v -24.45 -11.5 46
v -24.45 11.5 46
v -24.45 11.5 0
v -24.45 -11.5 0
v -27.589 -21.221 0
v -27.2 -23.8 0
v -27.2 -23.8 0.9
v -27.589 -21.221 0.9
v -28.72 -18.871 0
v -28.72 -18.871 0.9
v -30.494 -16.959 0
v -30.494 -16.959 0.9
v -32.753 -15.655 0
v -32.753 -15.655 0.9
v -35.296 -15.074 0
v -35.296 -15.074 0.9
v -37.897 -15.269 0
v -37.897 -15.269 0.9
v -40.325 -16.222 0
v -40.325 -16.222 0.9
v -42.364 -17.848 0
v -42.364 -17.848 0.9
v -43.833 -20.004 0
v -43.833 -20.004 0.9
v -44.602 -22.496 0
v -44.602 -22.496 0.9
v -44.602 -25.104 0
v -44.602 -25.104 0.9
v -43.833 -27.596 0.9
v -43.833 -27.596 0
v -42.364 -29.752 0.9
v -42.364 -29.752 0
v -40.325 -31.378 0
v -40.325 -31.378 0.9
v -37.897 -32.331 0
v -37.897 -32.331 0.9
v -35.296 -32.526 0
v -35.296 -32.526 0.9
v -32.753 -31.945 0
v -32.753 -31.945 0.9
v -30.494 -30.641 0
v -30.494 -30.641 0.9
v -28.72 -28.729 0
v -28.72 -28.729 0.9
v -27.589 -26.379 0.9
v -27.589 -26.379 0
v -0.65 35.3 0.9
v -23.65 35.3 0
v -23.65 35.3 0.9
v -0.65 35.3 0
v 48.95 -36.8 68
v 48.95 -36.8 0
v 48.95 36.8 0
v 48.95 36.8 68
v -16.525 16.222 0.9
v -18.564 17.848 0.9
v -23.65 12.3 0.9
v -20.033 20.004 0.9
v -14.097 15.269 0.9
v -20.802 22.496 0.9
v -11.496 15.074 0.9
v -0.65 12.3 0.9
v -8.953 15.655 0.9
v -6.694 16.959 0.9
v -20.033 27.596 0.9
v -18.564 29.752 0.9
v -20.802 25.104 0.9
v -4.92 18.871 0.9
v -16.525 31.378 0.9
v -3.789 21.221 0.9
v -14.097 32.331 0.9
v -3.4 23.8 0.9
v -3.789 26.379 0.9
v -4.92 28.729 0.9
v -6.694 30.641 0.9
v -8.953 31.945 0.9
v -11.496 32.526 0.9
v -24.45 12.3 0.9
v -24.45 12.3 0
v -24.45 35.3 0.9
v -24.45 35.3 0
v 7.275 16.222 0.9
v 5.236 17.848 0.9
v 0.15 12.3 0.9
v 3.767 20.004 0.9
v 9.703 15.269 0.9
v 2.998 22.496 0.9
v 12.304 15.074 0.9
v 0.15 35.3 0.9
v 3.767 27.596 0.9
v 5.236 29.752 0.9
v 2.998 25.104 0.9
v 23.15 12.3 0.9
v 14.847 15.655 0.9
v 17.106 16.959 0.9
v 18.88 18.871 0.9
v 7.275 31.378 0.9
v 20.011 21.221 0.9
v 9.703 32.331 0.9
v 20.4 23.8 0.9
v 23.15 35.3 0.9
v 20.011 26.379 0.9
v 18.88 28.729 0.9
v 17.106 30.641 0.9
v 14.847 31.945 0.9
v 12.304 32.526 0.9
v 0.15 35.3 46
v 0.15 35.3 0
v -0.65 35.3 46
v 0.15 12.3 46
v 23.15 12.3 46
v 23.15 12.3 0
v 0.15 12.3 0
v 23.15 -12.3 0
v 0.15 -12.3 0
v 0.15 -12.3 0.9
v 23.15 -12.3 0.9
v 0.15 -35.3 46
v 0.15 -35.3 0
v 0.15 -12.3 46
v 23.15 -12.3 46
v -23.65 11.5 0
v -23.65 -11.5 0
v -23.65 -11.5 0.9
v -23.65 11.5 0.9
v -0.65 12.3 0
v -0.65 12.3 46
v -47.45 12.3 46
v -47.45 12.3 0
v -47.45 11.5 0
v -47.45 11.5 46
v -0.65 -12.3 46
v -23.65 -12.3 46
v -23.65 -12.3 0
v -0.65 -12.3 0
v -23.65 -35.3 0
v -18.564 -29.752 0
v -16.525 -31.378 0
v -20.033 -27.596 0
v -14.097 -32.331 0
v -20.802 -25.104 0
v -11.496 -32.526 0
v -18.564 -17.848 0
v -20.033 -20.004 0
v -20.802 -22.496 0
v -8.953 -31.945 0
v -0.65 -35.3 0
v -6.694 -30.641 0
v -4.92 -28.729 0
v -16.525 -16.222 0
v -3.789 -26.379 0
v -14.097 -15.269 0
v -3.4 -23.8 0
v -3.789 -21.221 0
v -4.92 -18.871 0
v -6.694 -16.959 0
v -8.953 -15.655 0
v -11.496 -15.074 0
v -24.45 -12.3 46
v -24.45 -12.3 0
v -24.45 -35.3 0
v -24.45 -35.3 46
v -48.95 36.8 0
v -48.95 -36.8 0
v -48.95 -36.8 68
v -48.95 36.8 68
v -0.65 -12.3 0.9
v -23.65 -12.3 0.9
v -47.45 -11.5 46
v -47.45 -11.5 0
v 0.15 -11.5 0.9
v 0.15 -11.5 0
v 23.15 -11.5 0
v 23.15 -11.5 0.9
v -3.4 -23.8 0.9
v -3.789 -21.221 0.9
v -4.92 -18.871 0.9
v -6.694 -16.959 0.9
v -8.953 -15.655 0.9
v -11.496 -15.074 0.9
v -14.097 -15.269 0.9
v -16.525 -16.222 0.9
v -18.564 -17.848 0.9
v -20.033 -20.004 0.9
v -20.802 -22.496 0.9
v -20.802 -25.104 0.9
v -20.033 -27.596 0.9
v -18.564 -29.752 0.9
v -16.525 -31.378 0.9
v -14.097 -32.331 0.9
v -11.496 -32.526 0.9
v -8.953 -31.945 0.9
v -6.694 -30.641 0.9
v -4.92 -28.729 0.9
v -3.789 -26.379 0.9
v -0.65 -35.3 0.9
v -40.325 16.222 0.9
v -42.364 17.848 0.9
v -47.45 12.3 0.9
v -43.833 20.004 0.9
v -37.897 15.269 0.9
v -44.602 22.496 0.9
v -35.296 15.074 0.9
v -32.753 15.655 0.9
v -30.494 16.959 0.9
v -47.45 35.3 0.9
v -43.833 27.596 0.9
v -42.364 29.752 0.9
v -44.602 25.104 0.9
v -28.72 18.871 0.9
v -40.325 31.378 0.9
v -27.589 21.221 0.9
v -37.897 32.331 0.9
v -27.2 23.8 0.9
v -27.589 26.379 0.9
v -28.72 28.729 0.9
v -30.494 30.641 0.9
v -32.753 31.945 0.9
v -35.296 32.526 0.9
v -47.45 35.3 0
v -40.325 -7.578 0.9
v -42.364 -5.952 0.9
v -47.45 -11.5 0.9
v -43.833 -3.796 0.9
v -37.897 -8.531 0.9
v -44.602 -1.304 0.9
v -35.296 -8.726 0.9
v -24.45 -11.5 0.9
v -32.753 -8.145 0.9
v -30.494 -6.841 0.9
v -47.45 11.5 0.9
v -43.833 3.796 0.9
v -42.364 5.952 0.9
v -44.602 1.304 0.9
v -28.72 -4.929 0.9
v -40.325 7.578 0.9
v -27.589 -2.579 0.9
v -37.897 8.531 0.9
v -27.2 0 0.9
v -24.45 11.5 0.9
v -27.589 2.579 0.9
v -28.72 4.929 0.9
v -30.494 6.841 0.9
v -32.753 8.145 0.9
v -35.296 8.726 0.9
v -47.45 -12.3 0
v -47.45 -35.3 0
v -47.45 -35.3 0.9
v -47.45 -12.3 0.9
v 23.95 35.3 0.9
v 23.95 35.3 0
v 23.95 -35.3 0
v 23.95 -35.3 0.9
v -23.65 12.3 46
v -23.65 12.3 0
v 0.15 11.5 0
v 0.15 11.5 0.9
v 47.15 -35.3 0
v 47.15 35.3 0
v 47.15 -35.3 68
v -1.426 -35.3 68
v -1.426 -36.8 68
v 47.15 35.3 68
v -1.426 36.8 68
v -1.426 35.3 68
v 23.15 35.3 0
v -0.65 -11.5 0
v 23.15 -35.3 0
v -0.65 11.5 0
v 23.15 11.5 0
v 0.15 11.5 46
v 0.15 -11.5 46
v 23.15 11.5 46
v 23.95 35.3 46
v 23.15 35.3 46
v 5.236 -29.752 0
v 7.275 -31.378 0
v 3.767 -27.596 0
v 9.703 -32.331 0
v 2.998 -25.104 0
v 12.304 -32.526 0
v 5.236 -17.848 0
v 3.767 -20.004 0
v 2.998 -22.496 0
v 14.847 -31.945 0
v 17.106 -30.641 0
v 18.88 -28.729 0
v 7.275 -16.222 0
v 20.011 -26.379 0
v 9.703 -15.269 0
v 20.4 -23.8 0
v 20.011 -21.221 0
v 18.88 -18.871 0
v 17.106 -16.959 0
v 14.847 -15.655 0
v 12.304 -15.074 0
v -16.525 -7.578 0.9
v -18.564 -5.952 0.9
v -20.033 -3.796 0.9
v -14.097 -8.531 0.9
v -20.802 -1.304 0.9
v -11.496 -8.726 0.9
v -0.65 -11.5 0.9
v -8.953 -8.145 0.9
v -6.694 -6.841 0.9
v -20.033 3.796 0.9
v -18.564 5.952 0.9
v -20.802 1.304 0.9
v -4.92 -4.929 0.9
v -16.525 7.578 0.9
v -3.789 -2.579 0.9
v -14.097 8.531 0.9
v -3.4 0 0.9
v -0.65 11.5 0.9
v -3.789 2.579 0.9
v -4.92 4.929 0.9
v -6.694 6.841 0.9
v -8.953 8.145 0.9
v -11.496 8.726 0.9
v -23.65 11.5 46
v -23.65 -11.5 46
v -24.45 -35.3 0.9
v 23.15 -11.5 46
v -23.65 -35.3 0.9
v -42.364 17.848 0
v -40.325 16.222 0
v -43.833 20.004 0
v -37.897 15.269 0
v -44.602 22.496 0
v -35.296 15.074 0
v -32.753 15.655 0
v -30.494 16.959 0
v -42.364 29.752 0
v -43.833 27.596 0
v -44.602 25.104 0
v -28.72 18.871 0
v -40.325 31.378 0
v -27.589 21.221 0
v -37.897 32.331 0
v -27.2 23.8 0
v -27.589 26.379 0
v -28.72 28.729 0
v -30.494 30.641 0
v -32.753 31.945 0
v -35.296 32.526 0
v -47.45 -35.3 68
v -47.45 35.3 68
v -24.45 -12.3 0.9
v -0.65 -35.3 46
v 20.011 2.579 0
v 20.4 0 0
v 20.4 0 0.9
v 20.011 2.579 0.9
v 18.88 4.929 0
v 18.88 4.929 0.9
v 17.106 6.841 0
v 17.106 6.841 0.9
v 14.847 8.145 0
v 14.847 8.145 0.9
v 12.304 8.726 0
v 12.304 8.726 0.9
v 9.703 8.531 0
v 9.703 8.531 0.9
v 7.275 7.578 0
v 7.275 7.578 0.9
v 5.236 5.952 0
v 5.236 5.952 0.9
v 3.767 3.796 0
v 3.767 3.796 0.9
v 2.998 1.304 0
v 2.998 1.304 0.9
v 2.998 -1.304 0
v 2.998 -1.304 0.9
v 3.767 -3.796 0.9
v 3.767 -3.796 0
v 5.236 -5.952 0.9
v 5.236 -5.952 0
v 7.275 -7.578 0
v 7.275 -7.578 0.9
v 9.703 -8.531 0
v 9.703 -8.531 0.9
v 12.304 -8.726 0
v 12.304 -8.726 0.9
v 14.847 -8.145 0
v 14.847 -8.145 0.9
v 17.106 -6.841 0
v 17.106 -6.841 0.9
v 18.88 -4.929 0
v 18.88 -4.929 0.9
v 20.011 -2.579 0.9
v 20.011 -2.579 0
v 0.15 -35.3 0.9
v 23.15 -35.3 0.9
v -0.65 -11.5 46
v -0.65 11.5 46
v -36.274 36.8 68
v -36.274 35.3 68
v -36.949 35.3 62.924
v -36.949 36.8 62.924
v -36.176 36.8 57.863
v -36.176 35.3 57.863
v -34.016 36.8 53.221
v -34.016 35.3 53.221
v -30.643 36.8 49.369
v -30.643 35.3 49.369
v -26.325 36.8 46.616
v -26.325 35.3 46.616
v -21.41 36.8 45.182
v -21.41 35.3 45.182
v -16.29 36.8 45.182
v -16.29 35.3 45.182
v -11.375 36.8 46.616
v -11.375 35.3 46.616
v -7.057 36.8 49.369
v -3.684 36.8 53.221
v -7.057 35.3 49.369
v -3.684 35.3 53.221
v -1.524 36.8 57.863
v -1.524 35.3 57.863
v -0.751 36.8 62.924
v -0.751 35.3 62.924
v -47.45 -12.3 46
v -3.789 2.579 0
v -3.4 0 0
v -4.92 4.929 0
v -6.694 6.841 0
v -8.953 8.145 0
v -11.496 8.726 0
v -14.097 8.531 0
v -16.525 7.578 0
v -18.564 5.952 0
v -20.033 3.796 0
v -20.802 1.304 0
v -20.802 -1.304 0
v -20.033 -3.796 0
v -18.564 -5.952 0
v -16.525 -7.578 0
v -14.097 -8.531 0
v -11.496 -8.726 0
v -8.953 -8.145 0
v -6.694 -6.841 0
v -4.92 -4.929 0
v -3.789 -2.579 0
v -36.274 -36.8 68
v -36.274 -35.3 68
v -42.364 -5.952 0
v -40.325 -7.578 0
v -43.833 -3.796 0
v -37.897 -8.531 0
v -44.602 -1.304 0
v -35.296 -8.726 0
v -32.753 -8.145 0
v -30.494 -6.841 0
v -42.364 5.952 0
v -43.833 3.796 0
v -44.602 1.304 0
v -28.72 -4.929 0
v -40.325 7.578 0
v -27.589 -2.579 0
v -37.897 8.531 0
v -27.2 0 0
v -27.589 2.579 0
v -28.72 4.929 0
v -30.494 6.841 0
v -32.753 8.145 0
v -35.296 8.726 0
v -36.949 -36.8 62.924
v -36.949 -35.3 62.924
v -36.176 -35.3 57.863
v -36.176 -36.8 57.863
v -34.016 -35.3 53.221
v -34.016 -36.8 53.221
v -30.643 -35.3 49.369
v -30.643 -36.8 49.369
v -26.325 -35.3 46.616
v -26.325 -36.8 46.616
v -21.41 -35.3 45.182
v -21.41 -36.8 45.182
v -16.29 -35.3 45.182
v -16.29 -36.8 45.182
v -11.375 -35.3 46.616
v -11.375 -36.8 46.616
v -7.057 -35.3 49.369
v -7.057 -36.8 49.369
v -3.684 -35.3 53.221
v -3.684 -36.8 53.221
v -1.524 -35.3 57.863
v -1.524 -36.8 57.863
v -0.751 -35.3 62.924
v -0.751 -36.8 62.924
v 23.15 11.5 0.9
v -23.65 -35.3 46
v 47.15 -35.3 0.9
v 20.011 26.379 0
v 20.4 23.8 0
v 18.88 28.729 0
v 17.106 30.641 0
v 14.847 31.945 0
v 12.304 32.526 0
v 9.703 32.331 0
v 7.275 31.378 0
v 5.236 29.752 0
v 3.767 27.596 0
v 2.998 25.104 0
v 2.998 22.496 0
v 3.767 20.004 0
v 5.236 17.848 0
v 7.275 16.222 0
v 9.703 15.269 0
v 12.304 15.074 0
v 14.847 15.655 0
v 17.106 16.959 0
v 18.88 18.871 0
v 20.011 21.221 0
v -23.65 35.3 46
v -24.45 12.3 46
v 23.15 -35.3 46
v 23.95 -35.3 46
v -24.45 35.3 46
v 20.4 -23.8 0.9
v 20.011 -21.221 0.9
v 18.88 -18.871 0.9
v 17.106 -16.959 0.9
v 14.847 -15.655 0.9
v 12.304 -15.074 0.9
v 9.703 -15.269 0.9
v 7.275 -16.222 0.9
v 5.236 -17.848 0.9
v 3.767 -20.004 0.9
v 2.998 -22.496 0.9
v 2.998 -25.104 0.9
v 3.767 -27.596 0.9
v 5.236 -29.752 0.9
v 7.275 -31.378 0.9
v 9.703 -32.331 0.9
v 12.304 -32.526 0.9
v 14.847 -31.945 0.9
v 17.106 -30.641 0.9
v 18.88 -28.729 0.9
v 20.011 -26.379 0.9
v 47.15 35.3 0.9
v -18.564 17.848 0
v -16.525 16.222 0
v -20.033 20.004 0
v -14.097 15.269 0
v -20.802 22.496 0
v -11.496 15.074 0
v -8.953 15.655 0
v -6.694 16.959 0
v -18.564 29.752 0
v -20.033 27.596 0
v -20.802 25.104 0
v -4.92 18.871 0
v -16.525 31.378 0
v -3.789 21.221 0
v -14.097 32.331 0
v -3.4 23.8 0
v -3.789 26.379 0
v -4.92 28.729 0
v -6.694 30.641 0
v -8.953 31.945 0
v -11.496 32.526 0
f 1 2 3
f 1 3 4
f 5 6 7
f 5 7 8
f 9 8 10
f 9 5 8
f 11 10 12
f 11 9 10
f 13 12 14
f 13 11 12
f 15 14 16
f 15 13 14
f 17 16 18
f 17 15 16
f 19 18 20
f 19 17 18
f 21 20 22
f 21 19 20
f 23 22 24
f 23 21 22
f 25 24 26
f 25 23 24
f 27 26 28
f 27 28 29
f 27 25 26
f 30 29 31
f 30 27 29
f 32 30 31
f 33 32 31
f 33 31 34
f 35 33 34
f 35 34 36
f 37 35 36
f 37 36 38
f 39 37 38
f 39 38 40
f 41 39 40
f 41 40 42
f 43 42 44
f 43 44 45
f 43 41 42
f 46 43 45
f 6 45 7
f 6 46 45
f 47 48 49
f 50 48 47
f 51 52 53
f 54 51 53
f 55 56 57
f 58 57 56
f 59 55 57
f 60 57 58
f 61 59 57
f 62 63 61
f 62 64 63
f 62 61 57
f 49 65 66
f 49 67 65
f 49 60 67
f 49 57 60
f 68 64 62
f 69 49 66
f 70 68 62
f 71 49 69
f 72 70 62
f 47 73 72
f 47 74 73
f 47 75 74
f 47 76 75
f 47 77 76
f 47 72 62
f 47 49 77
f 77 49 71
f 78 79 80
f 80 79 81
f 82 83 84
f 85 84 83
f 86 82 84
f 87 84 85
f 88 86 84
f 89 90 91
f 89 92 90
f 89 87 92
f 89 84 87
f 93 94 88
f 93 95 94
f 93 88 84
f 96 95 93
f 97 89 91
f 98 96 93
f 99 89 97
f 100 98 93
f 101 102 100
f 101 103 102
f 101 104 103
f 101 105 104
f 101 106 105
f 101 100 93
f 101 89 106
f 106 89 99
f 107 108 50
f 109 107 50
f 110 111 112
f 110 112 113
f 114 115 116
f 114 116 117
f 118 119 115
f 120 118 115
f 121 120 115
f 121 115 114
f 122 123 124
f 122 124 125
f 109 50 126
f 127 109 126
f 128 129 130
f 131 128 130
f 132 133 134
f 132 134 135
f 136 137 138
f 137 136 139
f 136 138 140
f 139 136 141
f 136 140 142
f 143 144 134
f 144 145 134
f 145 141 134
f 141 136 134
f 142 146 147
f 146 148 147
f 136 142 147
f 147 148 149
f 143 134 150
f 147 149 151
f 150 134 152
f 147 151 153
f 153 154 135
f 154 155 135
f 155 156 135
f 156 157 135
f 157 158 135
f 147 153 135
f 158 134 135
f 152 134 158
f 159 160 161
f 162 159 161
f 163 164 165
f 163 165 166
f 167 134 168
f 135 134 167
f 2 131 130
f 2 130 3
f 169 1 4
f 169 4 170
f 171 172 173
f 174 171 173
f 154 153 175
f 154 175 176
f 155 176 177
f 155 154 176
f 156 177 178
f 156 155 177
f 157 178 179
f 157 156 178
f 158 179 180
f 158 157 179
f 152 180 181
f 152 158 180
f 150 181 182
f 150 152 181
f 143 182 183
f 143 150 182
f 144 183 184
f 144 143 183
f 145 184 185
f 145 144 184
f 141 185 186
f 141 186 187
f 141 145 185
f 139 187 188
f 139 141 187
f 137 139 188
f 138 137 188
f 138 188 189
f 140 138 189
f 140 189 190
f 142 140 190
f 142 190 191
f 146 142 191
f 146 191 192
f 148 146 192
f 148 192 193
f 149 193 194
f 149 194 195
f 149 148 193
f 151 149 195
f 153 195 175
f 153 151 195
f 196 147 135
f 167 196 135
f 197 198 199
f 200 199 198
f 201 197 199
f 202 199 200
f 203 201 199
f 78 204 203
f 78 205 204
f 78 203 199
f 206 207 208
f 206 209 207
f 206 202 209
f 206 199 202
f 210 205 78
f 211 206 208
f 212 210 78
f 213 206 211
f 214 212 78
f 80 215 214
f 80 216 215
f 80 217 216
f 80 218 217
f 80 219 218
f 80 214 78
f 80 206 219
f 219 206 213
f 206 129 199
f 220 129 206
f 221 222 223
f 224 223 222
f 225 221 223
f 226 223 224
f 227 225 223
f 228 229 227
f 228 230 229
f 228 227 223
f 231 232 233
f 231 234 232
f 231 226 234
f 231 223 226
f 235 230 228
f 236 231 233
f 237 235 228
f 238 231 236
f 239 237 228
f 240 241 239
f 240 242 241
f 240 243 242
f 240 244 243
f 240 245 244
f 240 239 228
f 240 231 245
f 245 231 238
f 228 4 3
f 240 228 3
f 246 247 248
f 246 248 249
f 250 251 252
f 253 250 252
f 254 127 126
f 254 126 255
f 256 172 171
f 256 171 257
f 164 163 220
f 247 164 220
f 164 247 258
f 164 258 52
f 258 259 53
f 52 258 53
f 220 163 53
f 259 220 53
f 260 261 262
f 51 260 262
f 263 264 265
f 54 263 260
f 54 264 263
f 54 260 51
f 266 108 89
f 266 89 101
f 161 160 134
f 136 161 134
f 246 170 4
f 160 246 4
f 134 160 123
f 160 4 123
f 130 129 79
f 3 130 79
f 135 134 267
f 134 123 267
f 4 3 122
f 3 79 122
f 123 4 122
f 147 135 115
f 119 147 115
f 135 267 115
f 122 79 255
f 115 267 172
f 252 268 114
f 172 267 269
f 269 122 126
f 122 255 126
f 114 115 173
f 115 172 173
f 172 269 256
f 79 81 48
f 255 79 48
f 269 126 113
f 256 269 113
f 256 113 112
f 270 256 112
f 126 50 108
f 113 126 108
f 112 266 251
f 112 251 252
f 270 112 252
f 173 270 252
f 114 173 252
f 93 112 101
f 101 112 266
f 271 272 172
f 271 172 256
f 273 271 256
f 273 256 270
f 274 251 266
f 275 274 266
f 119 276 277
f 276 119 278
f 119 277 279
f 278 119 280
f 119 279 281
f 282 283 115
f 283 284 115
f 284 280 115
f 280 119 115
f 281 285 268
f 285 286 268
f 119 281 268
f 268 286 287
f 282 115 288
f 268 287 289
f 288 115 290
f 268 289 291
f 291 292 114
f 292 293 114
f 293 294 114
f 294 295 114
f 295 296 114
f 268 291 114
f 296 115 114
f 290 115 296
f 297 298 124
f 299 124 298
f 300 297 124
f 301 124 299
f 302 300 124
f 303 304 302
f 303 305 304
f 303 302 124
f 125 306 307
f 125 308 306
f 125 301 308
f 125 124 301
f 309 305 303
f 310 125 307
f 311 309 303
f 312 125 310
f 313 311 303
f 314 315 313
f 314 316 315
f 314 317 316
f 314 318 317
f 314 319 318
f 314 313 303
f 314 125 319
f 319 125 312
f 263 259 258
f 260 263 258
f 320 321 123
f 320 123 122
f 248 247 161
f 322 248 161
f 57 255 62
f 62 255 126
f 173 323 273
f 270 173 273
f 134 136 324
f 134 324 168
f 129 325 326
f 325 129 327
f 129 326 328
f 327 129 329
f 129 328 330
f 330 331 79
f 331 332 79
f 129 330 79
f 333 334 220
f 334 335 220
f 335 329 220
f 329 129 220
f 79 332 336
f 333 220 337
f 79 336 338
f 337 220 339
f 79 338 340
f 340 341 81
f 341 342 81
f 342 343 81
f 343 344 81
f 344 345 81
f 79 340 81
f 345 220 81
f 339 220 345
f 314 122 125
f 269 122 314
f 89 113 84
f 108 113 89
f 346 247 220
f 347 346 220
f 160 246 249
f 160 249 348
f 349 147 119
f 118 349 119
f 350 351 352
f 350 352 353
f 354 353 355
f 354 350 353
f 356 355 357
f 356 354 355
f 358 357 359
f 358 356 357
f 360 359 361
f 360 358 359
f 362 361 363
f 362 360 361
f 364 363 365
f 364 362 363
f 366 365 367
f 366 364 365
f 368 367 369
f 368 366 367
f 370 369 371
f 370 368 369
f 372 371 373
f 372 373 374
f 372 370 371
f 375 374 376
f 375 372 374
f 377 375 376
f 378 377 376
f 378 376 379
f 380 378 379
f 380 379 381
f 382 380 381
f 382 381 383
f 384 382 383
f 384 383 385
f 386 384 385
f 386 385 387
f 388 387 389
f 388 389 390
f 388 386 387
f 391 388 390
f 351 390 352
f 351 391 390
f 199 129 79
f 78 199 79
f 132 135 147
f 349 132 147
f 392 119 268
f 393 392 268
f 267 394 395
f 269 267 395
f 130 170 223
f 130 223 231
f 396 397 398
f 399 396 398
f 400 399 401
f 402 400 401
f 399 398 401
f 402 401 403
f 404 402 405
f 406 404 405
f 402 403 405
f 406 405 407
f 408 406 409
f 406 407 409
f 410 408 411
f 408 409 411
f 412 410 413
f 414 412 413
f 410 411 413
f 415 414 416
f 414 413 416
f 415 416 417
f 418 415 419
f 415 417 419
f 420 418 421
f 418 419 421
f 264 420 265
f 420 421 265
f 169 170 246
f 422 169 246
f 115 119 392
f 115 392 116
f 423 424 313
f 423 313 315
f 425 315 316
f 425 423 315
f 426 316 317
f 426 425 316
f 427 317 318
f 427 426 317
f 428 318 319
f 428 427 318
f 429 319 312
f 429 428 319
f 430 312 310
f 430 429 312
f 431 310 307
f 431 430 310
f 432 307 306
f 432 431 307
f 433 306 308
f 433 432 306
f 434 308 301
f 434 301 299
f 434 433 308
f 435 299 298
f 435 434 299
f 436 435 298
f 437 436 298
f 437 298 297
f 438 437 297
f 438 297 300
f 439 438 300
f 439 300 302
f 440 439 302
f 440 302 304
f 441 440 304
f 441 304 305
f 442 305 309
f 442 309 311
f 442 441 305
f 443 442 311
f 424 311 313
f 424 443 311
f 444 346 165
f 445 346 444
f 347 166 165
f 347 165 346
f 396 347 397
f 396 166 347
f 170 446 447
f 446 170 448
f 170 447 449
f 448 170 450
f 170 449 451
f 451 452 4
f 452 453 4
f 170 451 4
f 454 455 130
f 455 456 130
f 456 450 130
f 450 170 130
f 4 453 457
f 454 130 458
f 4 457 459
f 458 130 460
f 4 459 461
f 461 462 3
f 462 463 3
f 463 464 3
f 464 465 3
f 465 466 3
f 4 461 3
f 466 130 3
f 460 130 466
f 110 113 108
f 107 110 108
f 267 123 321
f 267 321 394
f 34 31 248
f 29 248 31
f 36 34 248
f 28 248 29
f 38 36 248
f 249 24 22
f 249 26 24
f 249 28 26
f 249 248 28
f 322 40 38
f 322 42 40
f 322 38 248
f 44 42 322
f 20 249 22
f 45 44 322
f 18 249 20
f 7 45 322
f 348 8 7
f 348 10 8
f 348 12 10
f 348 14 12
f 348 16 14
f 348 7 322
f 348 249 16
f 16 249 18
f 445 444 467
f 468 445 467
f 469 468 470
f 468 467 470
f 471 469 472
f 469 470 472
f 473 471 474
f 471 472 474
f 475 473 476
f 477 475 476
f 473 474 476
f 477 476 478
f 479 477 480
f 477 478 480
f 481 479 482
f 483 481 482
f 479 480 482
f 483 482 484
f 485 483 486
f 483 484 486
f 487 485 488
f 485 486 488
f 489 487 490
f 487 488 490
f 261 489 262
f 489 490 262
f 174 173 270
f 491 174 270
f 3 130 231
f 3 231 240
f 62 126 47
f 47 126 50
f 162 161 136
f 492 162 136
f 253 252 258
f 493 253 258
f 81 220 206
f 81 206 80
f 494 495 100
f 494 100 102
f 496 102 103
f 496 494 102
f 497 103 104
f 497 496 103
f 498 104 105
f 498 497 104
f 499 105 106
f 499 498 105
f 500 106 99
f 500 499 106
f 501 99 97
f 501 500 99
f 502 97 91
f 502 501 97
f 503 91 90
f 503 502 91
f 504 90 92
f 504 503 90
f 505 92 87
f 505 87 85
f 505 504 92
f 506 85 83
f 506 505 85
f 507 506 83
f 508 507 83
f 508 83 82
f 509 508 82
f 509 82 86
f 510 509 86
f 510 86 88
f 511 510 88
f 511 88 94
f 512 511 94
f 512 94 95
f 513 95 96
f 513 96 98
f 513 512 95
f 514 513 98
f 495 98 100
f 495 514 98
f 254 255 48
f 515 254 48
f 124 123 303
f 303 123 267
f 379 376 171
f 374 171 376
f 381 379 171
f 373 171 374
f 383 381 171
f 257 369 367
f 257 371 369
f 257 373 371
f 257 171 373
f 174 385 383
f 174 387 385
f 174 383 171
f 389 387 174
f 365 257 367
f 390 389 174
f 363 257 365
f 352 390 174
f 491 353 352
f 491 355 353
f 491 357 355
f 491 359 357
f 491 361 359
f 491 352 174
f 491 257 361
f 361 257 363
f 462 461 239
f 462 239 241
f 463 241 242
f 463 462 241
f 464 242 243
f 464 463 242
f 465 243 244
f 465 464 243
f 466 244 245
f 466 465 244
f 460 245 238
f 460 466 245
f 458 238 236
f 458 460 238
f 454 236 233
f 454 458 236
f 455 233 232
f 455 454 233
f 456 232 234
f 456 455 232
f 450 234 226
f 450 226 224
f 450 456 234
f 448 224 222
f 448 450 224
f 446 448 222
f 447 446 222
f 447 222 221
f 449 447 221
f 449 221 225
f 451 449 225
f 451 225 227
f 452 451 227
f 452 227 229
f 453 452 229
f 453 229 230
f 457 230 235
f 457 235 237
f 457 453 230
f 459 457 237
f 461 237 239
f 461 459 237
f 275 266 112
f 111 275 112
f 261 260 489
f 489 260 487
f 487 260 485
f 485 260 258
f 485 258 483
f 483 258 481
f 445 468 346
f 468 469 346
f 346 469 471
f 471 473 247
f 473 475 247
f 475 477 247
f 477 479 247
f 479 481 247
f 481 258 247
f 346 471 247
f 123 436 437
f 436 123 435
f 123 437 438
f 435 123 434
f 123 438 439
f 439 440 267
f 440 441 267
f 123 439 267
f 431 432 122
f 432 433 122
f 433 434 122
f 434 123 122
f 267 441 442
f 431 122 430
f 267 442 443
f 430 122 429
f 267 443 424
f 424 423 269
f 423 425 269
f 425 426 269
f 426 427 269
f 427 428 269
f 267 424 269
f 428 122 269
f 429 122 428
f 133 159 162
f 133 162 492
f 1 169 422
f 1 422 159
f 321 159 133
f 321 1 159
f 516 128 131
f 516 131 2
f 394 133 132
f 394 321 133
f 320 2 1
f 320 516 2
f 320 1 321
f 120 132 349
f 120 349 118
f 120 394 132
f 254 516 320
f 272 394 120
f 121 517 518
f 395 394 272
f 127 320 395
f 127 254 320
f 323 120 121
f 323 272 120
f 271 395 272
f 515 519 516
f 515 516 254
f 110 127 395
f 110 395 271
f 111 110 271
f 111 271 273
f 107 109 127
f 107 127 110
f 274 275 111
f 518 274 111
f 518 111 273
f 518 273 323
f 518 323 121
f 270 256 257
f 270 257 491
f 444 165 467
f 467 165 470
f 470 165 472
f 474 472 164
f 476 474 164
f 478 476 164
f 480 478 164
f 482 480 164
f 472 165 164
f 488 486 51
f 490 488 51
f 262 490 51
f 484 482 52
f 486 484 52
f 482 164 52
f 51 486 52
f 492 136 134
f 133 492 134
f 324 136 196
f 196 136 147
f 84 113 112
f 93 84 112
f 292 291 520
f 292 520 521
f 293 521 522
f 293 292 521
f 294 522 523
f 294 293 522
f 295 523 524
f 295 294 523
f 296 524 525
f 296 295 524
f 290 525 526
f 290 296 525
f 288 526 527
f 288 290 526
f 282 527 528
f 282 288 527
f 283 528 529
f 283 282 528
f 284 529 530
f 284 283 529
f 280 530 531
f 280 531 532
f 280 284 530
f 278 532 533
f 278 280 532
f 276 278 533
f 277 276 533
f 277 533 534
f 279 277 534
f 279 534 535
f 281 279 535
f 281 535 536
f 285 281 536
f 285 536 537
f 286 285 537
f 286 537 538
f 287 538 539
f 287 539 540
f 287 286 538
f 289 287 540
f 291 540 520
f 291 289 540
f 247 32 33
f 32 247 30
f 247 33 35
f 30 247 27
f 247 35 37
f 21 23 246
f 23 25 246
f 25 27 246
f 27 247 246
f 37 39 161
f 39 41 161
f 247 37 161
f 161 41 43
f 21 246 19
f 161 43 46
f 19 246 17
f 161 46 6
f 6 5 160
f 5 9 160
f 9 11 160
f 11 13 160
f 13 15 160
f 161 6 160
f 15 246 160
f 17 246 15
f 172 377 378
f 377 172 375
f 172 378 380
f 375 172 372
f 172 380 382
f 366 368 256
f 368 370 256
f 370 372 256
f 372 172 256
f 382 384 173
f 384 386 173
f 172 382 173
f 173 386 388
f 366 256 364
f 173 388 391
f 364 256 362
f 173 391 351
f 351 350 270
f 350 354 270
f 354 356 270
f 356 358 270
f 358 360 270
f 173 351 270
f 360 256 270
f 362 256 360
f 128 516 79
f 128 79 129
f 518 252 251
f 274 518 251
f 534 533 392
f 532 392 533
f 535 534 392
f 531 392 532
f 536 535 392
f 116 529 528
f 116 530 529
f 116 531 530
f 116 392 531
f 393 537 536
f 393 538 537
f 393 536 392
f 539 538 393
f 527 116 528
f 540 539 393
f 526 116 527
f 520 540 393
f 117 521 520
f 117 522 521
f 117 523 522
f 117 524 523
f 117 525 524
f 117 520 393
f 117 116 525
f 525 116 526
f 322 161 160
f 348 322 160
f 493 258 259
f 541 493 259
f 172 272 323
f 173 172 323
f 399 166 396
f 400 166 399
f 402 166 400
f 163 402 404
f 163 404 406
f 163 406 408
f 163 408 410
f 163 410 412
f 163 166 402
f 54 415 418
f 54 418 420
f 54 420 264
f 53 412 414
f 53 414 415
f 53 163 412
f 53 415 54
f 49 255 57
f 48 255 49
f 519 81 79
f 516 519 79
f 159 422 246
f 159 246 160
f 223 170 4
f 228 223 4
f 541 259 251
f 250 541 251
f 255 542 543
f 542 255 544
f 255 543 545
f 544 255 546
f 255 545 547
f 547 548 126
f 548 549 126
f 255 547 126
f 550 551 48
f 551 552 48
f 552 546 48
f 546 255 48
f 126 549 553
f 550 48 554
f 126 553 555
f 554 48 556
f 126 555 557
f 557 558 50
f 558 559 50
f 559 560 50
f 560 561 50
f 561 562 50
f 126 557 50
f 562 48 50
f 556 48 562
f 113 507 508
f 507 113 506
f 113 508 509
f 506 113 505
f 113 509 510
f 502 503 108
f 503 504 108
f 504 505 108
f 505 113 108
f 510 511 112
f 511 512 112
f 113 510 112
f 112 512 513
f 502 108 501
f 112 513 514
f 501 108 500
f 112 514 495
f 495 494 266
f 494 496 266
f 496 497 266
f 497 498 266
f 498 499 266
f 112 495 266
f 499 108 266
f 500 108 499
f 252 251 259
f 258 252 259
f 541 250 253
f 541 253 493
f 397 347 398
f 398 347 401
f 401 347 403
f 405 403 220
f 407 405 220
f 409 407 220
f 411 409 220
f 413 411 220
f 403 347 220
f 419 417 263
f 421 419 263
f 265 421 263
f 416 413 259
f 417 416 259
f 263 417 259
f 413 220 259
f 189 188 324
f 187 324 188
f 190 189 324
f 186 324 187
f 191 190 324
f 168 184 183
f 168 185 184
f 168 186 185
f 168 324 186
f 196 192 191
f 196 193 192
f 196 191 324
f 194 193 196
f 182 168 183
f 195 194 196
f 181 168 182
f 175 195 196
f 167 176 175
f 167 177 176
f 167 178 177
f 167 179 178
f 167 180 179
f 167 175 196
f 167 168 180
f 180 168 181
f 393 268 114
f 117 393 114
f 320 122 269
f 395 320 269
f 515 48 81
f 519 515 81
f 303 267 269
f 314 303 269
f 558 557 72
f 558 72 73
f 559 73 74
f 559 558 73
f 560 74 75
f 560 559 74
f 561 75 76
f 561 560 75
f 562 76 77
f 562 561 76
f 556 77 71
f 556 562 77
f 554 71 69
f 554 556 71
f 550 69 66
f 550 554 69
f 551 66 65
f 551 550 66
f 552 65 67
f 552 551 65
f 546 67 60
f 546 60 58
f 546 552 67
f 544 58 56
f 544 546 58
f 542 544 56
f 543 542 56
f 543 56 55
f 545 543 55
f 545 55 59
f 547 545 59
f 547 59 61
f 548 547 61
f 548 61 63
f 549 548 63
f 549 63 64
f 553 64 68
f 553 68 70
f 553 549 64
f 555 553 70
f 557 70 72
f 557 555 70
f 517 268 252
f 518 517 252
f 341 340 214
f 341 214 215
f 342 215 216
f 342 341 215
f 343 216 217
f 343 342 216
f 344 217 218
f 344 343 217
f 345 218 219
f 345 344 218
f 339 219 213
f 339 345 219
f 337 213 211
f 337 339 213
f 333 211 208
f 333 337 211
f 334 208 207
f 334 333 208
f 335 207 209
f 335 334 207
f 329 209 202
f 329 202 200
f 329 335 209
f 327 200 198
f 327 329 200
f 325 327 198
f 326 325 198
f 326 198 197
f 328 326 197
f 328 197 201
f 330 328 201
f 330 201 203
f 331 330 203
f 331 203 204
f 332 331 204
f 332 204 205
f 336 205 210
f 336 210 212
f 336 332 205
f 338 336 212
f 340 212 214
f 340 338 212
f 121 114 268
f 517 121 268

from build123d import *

# Parameters (mm, degrees)
F0_W     = 23
F0_H     = 23
F0_R     = 8.75
F1_DEPTH = 0.9
F0_W_2   = 97.9
F0_H_2   = 73.6
F2_DEPTH = 68
F3_DEPTH = 46
F5_DEPTH = 100


# Not quite as in the source:
# - a feature names something its author has since deleted; it is built from what else it names


with BuildPart() as f1:
    # F0 (on Top) → F1 (new body)
    with BuildSketch(Plane.XY):
        with Locations((-35.95, 23.8)):
            Rectangle(F0_W, F0_H)
        with Locations((-35.95, 23.8)):
            Circle(F0_R, mode=Mode.SUBTRACT)
    extrude(amount=F1_DEPTH)


with BuildPart() as f1b:
    # F0 (on Top) → F1, piece 2 (new body)
    with BuildSketch(Plane.XY):
        with Locations((-12.15, 23.8)):
            Rectangle(F0_W, F0_H)
        with Locations((-12.15, 23.8)):
            Circle(F0_R, mode=Mode.SUBTRACT)
    extrude(amount=F1_DEPTH)


with BuildPart() as f1c:
    # F0 (on Top) → F1, piece 3 (new body)
    with BuildSketch(Plane.XY):
        with Locations((11.65, 23.8)):
            Rectangle(F0_W, F0_H)
        with Locations((11.65, 23.8)):
            Circle(F0_R, mode=Mode.SUBTRACT)
    extrude(amount=F1_DEPTH)


with BuildPart() as f1d:
    # F0 (on Top) → F1, piece 4 (new body)
    with BuildSketch(Plane.XY):
        Polygon((46.95, 35.3), (23.95, 35.3), (23.95, -35.3), (47.15, -35.3), (47.15, 35.3), align=None)
    extrude(amount=F1_DEPTH)


with BuildPart() as f1e:
    # F0 (on Top) → F1, piece 5 (new body)
    with BuildSketch(Plane.XY):
        with Locations((11.65, 0)):
            Rectangle(F0_W, F0_H)
        with Locations((11.65, 0)):
            Circle(F0_R, mode=Mode.SUBTRACT)
    extrude(amount=F1_DEPTH)


with BuildPart() as f1f:
    # F0 (on Top) → F1, piece 6 (new body)
    with BuildSketch(Plane.XY):
        with Locations((-12.15, 0)):
            Rectangle(F0_W, F0_H)
        with Locations((-12.15, 0)):
            Circle(F0_R, mode=Mode.SUBTRACT)
    extrude(amount=F1_DEPTH)


with BuildPart() as f1g:
    # F0 (on Top) → F1, piece 7 (new body)
    with BuildSketch(Plane.XY):
        with Locations((-35.95, 0)):
            Rectangle(F0_W, F0_H)
        with Locations((-35.95, 0)):
            Circle(F0_R, mode=Mode.SUBTRACT)
    extrude(amount=F1_DEPTH)


with BuildPart() as f1h:
    # F0 (on Top) → F1, piece 8 (new body)
    with BuildSketch(Plane.XY):
        with Locations((-35.95, -23.8)):
            Rectangle(F0_W, F0_H)
        with Locations((-35.95, -23.8)):
            Circle(F0_R, mode=Mode.SUBTRACT)
    extrude(amount=F1_DEPTH)


with BuildPart() as f1i:
    # F0 (on Top) → F1, piece 9 (new body)
    with BuildSketch(Plane.XY):
        with Locations((-12.15, -23.8)):
            Rectangle(F0_W, F0_H)
        with Locations((-12.15, -23.8)):
            Circle(F0_R, mode=Mode.SUBTRACT)
    extrude(amount=F1_DEPTH)


with BuildPart() as f1j:
    # F0 (on Top) → F1, piece 10 (new body)
    with BuildSketch(Plane.XY):
        with Locations((11.65, -23.8)):
            Rectangle(F0_W, F0_H)
        with Locations((11.65, -23.8)):
            Circle(F0_R, mode=Mode.SUBTRACT)
    extrude(amount=F1_DEPTH)


with BuildPart() as f2:
    # F0 (on Top) → F2 (new body)
    with BuildSketch(Plane.XY):
        Rectangle(F0_W_2, F0_H_2)
        Polygon((23.15, 35.3), (23.95, 35.3), (46.95, 35.3), (47.15, 35.3), (47.15, -35.3), (23.95, -35.3), (23.15, -35.3), (0.15, -35.3), (-0.65, -35.3), (-23.65, -35.3), (-24.45, -35.3), (-47.45, -35.3), (-47.45, -12.3), (-47.45, -11.5), (-47.45, 11.5), (-47.45, 12.3), (-47.45, 35.3), (-24.45, 35.3), (-23.65, 35.3), (-0.65, 35.3), (0.15, 35.3), align=None, mode=Mode.SUBTRACT)
    extrude(amount=F2_DEPTH)

    # F4 (on face) → F5 (cut)
    with BuildSketch(Plane.XZ.offset(36.8)):
        with BuildLine():
            Line((-1.4258787883, 68), (-36.2741212117, 68))
            ThreePointArc((-36.2741212117, 68), (-18.85, 45), (-1.4258787883, 68))
        make_face()
    extrude(amount=-F5_DEPTH, mode=Mode.SUBTRACT)


with BuildPart() as f3:
    # F0 (on Top) → F3 (new body)
    with BuildSketch(Plane.XY):
        Polygon((23.95, -35.3), (23.95, 35.3), (23.15, 35.3), (23.15, 12.3), (0.15, 12.3), (0.15, 35.3), (-0.65, 35.3), (-0.65, 12.3), (-23.65, 12.3), (-23.65, 35.3), (-24.45, 35.3), (-24.45, 12.3), (-47.45, 12.3), (-47.45, 11.5), (-24.45, 11.5), (-24.45, -11.5), (-47.45, -11.5), (-47.45, -12.3), (-24.45, -12.3), (-24.45, -35.3), (-23.65, -35.3), (-23.65, -12.3), (-0.65, -12.3), (-0.65, -35.3), (0.15, -35.3), (0.15, -12.3), (23.15, -12.3), (23.15, -35.3), align=None)
        with Locations((-12.15, 0)):
            Rectangle(F0_W, F0_H, mode=Mode.SUBTRACT)
        with Locations((11.65, 0)):
            Rectangle(F0_W, F0_H, mode=Mode.SUBTRACT)
    extrude(amount=F3_DEPTH)


solid = Compound([f1.part, f1b.part, f1c.part, f1d.part, f1e.part, f1f.part, f1g.part, f1h.part, f1i.part, f1j.part, f2.part, f3.part])
